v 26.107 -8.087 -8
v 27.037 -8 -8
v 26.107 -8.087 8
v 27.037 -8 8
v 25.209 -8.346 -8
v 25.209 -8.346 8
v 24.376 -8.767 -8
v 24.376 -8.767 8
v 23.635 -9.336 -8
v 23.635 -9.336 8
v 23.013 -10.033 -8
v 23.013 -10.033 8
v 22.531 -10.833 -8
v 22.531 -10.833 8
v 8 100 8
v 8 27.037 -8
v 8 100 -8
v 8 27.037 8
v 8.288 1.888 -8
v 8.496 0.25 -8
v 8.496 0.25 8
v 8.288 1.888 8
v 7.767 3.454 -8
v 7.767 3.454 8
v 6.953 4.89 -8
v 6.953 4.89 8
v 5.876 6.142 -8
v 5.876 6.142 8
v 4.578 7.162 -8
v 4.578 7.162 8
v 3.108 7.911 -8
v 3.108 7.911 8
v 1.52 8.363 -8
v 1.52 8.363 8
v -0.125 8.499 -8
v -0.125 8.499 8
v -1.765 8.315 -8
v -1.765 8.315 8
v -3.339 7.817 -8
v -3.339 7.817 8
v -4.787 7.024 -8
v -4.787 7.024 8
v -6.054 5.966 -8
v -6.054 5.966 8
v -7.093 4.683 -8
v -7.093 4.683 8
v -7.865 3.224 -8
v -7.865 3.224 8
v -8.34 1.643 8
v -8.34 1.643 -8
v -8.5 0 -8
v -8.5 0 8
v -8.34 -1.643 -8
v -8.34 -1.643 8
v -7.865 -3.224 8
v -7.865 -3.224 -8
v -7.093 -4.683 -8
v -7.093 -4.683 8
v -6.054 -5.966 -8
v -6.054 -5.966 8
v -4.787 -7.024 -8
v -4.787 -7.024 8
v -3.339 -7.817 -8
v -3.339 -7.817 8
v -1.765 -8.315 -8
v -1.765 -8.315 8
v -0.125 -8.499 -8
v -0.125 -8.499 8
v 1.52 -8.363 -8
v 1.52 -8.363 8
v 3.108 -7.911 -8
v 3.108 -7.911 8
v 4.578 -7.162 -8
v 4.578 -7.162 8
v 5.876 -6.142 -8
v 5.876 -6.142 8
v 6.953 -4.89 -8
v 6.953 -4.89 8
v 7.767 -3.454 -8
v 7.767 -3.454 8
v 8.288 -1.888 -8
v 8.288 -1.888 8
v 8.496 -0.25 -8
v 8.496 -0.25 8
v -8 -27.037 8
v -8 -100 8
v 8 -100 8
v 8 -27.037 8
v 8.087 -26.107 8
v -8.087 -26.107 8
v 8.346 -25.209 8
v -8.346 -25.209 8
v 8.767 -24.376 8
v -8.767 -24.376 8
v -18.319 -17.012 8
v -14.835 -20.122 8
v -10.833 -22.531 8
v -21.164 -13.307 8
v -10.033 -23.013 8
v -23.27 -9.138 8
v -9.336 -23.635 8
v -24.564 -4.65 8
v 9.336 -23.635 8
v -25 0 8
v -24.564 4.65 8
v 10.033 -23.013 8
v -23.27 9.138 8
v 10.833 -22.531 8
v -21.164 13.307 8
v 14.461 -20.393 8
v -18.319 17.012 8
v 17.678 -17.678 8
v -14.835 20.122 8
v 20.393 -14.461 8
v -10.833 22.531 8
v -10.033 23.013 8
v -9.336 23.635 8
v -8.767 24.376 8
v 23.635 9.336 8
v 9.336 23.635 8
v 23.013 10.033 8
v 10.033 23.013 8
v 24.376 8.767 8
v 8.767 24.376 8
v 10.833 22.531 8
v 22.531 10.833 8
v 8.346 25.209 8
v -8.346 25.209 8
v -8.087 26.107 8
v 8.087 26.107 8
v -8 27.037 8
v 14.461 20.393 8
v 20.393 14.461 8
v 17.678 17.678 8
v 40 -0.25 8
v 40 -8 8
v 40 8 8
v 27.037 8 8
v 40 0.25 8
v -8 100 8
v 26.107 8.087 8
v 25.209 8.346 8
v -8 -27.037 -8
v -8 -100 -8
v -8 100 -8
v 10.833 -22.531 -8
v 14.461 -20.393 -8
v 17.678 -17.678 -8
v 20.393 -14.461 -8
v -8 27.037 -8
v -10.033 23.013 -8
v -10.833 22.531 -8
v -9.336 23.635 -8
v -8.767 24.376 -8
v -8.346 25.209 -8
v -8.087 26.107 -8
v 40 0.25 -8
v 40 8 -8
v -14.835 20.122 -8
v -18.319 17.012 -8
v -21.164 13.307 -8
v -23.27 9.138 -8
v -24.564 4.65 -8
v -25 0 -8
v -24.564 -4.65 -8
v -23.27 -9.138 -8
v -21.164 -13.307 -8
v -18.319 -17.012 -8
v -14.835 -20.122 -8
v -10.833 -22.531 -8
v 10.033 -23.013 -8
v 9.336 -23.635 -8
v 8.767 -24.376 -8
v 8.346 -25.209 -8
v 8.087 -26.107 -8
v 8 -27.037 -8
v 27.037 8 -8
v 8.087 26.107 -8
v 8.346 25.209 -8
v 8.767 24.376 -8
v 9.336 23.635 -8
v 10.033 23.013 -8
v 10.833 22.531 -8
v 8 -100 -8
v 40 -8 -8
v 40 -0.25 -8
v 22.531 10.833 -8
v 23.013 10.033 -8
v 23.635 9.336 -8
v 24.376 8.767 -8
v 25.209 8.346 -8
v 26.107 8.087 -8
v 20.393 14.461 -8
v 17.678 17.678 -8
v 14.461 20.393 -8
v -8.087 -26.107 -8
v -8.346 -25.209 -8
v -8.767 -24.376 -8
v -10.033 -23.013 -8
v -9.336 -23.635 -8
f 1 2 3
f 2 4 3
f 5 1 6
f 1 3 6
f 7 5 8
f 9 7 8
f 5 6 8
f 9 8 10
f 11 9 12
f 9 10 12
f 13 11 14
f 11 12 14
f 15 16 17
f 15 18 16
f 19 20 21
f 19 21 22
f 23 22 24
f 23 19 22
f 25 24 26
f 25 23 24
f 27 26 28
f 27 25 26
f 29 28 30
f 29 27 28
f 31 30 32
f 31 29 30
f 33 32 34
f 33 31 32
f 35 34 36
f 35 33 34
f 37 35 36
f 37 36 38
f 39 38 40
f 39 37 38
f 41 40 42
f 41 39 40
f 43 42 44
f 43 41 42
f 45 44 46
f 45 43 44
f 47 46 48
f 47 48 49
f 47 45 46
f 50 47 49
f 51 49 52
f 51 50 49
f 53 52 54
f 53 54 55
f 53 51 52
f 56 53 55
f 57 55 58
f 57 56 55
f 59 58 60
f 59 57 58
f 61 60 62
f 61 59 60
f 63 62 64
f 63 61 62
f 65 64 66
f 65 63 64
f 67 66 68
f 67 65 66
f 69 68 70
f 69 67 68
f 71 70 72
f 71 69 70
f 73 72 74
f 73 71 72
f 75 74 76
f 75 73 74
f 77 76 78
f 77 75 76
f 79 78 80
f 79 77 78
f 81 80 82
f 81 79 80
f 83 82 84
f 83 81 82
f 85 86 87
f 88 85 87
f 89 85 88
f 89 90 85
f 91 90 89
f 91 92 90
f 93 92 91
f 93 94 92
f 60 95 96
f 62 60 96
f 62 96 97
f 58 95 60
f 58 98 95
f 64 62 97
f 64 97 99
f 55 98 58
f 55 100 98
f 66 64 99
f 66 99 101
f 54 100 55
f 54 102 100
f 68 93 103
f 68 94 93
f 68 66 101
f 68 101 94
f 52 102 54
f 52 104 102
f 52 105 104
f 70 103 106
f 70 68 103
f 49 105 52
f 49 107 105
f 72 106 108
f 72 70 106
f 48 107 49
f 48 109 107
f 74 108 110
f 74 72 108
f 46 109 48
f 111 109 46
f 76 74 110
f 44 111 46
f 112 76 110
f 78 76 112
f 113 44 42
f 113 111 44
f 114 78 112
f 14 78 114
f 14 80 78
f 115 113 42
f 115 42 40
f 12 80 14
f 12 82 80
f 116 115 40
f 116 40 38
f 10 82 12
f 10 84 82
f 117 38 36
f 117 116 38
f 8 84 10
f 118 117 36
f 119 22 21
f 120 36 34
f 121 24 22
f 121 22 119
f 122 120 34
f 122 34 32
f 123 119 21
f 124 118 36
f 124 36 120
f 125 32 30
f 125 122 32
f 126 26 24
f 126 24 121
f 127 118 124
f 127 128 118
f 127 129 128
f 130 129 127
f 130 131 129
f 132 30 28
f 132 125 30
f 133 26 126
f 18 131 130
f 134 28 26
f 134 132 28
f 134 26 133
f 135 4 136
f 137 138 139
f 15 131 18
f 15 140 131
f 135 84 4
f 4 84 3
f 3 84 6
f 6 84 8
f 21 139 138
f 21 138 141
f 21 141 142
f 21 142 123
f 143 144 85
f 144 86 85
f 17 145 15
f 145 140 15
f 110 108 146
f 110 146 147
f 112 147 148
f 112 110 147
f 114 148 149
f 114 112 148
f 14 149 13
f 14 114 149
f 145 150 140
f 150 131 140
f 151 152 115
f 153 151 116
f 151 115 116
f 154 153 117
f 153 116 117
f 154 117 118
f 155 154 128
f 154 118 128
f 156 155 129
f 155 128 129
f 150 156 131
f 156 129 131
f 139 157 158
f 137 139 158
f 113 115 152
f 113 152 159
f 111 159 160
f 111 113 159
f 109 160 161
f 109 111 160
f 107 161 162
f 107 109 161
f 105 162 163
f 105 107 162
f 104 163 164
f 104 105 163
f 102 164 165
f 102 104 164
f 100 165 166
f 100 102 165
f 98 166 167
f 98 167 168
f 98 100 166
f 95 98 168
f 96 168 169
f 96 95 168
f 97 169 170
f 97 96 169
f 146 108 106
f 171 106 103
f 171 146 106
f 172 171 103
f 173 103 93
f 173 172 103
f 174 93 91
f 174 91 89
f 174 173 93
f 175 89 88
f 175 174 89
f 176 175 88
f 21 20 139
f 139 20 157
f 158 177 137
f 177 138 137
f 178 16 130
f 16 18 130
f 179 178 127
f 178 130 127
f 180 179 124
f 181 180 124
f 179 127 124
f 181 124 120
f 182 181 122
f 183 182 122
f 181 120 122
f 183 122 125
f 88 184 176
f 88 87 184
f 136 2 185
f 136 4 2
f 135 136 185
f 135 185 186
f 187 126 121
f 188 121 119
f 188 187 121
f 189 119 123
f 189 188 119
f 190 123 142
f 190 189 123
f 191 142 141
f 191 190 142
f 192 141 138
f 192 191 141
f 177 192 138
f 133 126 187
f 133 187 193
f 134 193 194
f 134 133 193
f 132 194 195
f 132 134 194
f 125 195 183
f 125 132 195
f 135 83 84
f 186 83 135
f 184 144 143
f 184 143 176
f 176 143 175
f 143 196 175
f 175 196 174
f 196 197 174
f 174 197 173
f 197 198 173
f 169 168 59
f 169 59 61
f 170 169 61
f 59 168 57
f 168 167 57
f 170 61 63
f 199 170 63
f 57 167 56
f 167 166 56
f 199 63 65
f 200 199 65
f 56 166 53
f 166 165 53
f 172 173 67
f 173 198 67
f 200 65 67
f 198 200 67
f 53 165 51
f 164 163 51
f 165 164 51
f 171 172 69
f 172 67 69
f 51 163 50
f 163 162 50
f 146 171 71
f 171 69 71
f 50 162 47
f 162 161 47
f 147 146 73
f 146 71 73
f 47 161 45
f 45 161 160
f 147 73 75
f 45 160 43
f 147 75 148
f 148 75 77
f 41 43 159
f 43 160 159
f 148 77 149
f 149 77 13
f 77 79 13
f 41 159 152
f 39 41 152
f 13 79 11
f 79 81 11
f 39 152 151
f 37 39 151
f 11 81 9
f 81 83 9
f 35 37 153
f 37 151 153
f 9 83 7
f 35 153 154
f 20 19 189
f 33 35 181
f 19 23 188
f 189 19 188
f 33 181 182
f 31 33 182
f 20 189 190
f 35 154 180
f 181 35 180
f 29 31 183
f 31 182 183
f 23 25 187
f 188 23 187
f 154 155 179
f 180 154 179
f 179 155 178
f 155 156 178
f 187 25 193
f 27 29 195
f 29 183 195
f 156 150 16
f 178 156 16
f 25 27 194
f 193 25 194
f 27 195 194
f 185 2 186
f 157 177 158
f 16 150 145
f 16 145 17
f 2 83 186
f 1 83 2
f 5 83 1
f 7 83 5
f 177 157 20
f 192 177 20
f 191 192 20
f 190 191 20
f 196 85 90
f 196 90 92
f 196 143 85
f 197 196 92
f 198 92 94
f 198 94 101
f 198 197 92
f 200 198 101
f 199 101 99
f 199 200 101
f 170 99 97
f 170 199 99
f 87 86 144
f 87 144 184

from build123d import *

# Parameters (mm, degrees)
SKETCH1_R               = 25
SKETCH1_R_2             = 8.5
BOSS_EXTRUDE1_DEPTH     = 8
SKETCH2_W               = 16
SKETCH2_H               = 76.314561435
BOSS_EXTRUDE2_DEPTH     = 8
SKETCH3_W               = 16
SKETCH3_H               = 76.314561435
BOSS_EXTRUDE3_DEPTH     = 8
SKETCH4_W               = 16.314561435
SKETCH4_H               = 16
BOSS_EXTRUDE4_DEPTH     = 8
CUT_EXTRUDE1_DEPTH      = 109
CUT_EXTRUDE1_DEPTH_BACK = 109
SKETCH5_W               = 48
SKETCH5_H               = 0.5
FILLET1_R               = 5


with BuildPart() as part:
    # Sketch1 → Boss-Extrude1 (new, symmetric)
    with BuildSketch(Plane.XY):
        Circle(SKETCH1_R)
        Circle(SKETCH1_R_2, mode=Mode.SUBTRACT)
    extrude(amount=BOSS_EXTRUDE1_DEPTH, both=True)

    # Sketch2 → Boss-Extrude2 (add, symmetric)
    with BuildSketch(Plane.XY):
        with Locations((0, 61.842719282)):
            Rectangle(SKETCH2_W, SKETCH2_H)
    extrude(amount=BOSS_EXTRUDE2_DEPTH, both=True)

    # Sketch3 → Boss-Extrude3 (add, symmetric)
    with BuildSketch(Plane.XY):
        with Locations((0, -61.842719282)):
            Rectangle(SKETCH3_W, SKETCH3_H)
    extrude(amount=BOSS_EXTRUDE3_DEPTH, both=True)

    # Sketch4 → Boss-Extrude4 (add, symmetric)
    with BuildSketch(Plane.XY):
        with Locations((31.842719282, 0)):
            Rectangle(SKETCH4_W, SKETCH4_H)
    extrude(amount=BOSS_EXTRUDE4_DEPTH, both=True)

    # Sketch5 → Cut-Extrude1 (cut, two sides: drawn at the far end of the back side and taken through both)
    with BuildSketch(Plane.XY.offset(-CUT_EXTRUDE1_DEPTH_BACK)):
        with Locations((26, 0)):
            Rectangle(SKETCH5_W, SKETCH5_H)
    extrude(amount=CUT_EXTRUDE1_DEPTH + CUT_EXTRUDE1_DEPTH_BACK, mode=Mode.SUBTRACT)

    # Fillet1
    fillet1_edges = [part.edges().sort_by_distance(p)[0] for p in [
        (8, 23.685438565, 0),
        (-8, 23.685438565, 0),
        (8, -23.685438565, 0),
        (-8, -23.685438565, 0),
        (23.685438565, -8, 0),
        (23.685438565, 8, 0),
    ]]
    fillet(fillet1_edges, radius=FILLET1_R)


solid = part.part
